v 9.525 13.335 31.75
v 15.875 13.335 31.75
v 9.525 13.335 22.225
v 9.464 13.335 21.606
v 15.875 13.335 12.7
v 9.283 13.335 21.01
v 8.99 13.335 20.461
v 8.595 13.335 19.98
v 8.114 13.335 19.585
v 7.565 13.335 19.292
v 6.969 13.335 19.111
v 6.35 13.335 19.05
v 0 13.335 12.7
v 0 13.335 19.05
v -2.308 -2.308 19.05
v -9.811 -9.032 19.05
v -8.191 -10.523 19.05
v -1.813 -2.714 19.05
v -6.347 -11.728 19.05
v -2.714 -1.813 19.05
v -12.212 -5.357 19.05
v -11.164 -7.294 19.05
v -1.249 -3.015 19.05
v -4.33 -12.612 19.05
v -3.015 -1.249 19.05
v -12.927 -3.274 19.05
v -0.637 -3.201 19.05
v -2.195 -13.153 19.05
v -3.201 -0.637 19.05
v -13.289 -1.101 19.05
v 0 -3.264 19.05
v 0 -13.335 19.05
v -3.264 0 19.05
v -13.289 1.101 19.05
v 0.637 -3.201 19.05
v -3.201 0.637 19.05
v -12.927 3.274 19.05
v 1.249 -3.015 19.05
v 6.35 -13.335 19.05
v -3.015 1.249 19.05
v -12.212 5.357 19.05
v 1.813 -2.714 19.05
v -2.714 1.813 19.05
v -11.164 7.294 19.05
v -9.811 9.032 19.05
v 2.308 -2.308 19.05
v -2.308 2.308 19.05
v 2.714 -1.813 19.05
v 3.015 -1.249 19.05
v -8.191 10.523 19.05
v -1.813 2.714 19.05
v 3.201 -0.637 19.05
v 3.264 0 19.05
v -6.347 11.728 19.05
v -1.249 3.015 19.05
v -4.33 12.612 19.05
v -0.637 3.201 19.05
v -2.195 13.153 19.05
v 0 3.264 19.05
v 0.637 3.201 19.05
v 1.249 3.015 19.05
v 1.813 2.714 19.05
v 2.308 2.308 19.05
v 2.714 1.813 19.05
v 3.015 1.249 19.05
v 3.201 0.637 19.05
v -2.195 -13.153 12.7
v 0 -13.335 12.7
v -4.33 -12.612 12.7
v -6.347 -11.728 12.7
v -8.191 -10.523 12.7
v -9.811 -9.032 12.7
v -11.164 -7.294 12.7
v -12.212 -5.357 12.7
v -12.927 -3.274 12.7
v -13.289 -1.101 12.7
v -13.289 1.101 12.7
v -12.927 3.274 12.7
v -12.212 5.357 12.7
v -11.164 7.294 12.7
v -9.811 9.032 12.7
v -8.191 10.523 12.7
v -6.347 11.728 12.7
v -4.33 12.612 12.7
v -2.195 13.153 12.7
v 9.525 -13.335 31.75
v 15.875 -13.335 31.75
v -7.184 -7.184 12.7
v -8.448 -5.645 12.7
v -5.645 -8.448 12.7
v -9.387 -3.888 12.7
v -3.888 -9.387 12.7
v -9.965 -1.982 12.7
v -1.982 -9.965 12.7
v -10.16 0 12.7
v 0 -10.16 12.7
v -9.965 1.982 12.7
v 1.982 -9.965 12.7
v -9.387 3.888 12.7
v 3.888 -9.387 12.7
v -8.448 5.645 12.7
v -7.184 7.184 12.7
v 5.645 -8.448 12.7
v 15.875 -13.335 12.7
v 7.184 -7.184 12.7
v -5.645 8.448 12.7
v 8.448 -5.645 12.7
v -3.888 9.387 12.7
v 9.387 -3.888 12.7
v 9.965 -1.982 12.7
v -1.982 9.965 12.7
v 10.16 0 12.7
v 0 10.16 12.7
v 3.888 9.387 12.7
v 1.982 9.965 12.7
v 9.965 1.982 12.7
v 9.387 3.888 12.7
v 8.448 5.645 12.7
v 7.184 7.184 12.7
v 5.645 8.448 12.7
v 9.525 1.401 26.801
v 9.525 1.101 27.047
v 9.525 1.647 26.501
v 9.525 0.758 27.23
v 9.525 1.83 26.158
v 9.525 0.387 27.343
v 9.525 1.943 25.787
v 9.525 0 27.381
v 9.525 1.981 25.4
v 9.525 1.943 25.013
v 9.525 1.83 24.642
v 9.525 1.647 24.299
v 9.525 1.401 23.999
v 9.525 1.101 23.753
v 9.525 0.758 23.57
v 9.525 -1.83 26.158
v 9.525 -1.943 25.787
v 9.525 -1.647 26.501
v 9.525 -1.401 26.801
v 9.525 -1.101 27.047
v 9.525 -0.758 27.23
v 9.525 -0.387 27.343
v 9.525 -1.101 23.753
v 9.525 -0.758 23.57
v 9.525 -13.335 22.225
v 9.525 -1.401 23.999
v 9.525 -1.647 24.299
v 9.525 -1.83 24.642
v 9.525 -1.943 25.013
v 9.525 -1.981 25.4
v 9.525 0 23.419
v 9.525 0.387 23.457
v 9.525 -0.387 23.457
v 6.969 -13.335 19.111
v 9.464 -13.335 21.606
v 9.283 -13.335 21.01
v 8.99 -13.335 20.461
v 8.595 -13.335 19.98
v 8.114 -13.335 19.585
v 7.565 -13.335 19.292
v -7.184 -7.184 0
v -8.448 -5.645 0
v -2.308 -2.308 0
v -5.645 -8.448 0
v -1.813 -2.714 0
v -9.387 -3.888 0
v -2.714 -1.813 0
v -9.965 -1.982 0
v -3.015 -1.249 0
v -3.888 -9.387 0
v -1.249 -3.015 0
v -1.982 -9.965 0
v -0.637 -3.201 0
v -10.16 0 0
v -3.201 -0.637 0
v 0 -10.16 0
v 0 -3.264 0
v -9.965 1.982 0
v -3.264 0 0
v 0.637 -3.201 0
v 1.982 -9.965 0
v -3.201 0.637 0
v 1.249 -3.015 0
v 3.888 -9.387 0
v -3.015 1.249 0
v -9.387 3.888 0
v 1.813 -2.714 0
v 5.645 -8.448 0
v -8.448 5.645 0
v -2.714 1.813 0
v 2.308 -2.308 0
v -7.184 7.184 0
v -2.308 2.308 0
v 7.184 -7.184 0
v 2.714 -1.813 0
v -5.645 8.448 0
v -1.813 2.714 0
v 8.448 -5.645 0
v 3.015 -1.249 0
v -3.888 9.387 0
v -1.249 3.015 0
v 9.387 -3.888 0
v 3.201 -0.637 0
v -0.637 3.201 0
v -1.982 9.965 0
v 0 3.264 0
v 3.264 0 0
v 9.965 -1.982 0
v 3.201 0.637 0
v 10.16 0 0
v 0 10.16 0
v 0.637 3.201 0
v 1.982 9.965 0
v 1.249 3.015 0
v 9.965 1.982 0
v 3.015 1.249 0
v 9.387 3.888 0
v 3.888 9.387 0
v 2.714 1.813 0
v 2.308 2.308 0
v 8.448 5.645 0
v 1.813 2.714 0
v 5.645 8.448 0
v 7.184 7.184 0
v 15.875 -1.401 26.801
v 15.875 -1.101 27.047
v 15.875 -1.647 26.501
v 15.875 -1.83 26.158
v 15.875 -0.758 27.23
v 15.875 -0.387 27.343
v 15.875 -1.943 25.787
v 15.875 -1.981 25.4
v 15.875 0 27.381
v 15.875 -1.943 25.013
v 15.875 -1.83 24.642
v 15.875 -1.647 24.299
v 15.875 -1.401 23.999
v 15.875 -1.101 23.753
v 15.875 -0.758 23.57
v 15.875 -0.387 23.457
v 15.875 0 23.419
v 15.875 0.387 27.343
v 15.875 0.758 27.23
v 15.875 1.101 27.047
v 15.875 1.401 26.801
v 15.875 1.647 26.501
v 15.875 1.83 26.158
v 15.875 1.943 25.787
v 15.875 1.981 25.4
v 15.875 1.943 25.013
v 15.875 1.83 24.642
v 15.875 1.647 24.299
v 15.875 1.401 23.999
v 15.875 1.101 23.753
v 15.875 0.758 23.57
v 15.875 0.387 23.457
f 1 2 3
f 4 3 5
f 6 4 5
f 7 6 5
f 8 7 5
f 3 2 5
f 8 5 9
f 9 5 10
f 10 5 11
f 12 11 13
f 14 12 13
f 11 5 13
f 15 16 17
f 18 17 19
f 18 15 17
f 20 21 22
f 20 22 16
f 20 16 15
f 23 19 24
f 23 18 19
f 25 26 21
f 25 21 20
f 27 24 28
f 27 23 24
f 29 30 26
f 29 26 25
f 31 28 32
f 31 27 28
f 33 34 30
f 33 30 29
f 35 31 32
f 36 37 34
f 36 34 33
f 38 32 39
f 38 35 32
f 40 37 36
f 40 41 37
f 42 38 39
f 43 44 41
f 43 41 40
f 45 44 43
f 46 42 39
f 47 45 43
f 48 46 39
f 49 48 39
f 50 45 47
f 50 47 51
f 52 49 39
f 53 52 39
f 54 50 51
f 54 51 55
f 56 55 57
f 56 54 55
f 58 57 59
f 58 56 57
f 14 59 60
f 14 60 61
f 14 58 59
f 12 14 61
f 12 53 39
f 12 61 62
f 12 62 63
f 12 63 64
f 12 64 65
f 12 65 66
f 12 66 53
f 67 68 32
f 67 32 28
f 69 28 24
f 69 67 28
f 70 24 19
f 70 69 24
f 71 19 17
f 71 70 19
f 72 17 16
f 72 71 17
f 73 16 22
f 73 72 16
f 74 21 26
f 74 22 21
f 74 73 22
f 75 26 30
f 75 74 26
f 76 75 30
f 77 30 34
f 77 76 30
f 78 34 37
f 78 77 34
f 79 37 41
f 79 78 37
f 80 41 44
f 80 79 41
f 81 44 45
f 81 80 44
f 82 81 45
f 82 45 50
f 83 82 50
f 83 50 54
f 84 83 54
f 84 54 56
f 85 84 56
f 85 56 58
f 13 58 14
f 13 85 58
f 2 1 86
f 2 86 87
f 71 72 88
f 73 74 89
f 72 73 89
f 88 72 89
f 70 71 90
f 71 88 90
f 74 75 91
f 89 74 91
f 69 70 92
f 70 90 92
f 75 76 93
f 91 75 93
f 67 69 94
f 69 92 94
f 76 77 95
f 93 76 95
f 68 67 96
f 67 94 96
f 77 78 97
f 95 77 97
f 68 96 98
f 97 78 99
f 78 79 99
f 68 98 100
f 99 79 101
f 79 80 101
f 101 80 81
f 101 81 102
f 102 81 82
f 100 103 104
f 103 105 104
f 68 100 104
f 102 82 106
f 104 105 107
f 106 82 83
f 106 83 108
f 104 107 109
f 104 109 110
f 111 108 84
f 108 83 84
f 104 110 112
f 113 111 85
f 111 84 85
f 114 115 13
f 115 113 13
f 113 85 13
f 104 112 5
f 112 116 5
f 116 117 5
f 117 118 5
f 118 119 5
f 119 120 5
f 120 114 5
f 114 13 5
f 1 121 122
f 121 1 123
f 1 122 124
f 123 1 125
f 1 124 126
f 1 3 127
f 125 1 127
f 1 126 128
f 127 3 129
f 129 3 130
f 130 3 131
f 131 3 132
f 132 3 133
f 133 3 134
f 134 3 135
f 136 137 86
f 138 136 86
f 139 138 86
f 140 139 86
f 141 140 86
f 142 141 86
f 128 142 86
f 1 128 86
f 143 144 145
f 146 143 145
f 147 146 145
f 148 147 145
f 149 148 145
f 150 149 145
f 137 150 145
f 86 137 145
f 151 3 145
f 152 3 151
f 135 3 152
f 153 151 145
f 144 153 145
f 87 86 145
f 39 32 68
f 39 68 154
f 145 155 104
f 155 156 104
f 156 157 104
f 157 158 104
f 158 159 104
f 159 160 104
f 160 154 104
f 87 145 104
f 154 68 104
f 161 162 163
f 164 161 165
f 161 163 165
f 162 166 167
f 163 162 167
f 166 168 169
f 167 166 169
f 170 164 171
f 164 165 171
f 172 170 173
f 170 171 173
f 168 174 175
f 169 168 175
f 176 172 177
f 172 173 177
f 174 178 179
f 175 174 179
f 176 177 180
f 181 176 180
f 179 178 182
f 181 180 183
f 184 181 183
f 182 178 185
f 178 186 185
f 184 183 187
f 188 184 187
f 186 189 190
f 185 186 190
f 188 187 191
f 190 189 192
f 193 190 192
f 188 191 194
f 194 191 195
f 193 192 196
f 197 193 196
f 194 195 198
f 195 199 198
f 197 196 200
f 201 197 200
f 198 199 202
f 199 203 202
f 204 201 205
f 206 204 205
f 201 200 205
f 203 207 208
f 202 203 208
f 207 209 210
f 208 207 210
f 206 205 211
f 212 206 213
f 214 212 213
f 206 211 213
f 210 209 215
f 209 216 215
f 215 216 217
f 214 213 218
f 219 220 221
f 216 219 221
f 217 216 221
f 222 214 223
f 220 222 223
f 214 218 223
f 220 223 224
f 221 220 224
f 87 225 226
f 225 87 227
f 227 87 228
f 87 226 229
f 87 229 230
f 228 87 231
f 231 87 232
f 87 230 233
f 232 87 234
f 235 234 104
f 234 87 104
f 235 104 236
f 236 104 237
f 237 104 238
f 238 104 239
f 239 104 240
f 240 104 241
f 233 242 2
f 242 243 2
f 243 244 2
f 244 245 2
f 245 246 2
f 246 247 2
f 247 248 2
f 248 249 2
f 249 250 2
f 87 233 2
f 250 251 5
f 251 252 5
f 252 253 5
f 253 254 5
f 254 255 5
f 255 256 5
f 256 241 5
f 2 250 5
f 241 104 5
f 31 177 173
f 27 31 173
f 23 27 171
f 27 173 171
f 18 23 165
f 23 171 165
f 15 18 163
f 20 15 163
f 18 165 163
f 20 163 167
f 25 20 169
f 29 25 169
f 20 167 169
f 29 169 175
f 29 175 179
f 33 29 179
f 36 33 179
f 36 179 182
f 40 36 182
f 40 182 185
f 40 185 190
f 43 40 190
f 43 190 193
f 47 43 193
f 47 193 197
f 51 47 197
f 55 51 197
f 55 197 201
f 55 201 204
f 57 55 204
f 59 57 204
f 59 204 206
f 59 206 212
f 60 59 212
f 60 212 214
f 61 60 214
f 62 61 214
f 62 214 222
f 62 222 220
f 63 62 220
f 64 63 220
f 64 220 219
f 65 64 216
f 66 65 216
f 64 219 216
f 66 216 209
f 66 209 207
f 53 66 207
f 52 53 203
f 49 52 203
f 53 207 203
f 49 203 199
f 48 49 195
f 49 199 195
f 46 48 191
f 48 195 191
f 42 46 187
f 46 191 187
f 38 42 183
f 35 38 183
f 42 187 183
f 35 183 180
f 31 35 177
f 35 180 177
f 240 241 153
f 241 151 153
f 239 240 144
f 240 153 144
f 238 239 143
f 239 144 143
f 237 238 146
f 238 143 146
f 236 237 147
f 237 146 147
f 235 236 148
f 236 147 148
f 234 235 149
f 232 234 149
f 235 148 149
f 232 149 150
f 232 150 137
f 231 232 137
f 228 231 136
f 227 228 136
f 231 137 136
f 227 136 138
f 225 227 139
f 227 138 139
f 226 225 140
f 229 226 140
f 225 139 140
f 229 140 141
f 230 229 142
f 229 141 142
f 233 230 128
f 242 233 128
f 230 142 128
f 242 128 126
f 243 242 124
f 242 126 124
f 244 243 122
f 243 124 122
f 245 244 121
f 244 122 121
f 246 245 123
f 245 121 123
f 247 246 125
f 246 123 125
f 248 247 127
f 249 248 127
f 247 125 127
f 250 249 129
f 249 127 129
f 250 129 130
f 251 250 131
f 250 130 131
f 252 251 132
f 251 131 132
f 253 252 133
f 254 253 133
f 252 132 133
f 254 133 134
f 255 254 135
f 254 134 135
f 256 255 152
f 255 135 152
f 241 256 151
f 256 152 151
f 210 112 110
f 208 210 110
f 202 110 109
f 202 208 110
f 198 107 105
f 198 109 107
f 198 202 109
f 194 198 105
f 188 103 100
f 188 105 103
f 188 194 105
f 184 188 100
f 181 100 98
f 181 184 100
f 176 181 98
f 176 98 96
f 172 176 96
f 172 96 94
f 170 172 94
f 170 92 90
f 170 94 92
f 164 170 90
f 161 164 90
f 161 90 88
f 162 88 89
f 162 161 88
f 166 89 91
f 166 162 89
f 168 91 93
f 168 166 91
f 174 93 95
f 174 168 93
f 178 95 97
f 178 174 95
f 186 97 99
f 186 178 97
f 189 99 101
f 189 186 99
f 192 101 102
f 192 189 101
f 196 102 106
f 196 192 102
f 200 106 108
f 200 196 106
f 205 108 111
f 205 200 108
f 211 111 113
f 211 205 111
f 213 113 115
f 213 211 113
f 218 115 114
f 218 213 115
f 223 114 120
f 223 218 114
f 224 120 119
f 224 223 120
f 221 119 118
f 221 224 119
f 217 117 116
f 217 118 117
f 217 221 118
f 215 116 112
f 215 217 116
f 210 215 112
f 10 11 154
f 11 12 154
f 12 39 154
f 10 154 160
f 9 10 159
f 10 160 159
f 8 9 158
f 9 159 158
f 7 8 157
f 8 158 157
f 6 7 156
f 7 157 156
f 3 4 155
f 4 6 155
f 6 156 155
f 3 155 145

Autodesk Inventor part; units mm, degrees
ref_plane "YZ Plane" through (0, 0, 0) normal (1, 0, 0) x (0, 1, 0)
ref_plane "XZ Plane" through (0, 0, 0) normal (0, 1, 0) x (-1, 0, 0)
ref_plane "XY Plane" through (0, 0, 0) normal (0, 0, 1) x (1, 0, 0)
sketch "Sketch1" plane through (0, 0, 0) normal (0, 0, 1) x (1, 0, 0)
  circle A0 centre (0, 0) radius 10.16
  circle A1 centre (0, 0) radius 8.7376
  dimension "d0" = 20.32
  dimension "d6" = 17.4752
extrude "Extrusion1" add sketch "Sketch1" along normal blind 12.7 contours A0 | A1
sketch "Sketch2" plane through (0, 0, 12.7) normal (0, 0, 1) x (1, 0, 0)
  circle A0 centre (0, 0) radius 10.16 projected
  circle A1 centre (0, 0) radius 13.335 construction
  line L0 (0, 13.335) -> (15.875, 13.335)
  line L1 (15.875, 13.335) -> (15.875, -13.335)
  line L2 (15.875, -13.335) -> (0, -13.335)
  arc A2 (0, 13.335) -> (0, -13.335) centre (0, 0) ccw
  point P0 (15.875, 0)
  dimension "d3" = 3.175
  dimension "d14" = 15.875
extrude "Extrusion2" add sketch "Sketch2" along normal blind 6.35 contours A0 | L0 L1 L2 A2
sketch "Sketch4" plane through (0, 0, 19.05) normal (0, 0, 1) x (1, 0, 0)
  arc A0 (0, 13.335) -> (0, -13.335) centre (0, 0) ccw projected
hole "Hole2" at (0, 0, 19.05) direction (0, 0, -1) diameter 6.5278 end through all clearance for "Flat Head Machine Screw (82)" size "1/4" standard "Ansi Unified Screw Threads"
sketch "Sketch5" plane through (0, 0, 19.05) normal (0, 0, 1) x (1, 0, 0)
  line L0 (15.875, 13.335) -> (0, 13.335) projected
  line L1 (0, -13.335) -> (15.875, -13.335) projected
  line L2 (15.875, 13.335) -> (9.525, 13.335)
  line L3 (9.525, 13.335) -> (9.525, -13.335)
  line L4 (9.525, -13.335) -> (15.875, -13.335)
  line L5 (15.875, -13.335) -> (15.875, 13.335)
  point P0 (0, 0)
  dimension "d22" = 6.35
extrude "Extrusion3" add sketch "Sketch5" along normal blind 12.7
fillet "Fillet1" radius 3.175 1 edges at (9.525, 0, 19.05)
sketch "Sketch6" plane through (15.875, -13.335, 12.7) normal (1, 0, 0) x (0, 0, -1)
  line L0 (0, 26.67) -> (-19.05, 26.67) construction
  line L1 (-19.05, 0) -> (-19.05, 26.67) construction
  point P0 (12.7, 13.335)
  point P1 (-12.7, 13.335)
  point P2 (-9.525, 26.67)
  point P3 (-19.05, 13.335)
  dimension "d35" = 6.35
hole "Hole3" at (15.875, 0, 25.4) direction (-1, 0, 0) diameter 3.9624 end through all thread size "10-32 UNF" class "2B" standard "ANSI Unified Screw Threads"
properties part number "EL2-031" material "ABS Plastic"
